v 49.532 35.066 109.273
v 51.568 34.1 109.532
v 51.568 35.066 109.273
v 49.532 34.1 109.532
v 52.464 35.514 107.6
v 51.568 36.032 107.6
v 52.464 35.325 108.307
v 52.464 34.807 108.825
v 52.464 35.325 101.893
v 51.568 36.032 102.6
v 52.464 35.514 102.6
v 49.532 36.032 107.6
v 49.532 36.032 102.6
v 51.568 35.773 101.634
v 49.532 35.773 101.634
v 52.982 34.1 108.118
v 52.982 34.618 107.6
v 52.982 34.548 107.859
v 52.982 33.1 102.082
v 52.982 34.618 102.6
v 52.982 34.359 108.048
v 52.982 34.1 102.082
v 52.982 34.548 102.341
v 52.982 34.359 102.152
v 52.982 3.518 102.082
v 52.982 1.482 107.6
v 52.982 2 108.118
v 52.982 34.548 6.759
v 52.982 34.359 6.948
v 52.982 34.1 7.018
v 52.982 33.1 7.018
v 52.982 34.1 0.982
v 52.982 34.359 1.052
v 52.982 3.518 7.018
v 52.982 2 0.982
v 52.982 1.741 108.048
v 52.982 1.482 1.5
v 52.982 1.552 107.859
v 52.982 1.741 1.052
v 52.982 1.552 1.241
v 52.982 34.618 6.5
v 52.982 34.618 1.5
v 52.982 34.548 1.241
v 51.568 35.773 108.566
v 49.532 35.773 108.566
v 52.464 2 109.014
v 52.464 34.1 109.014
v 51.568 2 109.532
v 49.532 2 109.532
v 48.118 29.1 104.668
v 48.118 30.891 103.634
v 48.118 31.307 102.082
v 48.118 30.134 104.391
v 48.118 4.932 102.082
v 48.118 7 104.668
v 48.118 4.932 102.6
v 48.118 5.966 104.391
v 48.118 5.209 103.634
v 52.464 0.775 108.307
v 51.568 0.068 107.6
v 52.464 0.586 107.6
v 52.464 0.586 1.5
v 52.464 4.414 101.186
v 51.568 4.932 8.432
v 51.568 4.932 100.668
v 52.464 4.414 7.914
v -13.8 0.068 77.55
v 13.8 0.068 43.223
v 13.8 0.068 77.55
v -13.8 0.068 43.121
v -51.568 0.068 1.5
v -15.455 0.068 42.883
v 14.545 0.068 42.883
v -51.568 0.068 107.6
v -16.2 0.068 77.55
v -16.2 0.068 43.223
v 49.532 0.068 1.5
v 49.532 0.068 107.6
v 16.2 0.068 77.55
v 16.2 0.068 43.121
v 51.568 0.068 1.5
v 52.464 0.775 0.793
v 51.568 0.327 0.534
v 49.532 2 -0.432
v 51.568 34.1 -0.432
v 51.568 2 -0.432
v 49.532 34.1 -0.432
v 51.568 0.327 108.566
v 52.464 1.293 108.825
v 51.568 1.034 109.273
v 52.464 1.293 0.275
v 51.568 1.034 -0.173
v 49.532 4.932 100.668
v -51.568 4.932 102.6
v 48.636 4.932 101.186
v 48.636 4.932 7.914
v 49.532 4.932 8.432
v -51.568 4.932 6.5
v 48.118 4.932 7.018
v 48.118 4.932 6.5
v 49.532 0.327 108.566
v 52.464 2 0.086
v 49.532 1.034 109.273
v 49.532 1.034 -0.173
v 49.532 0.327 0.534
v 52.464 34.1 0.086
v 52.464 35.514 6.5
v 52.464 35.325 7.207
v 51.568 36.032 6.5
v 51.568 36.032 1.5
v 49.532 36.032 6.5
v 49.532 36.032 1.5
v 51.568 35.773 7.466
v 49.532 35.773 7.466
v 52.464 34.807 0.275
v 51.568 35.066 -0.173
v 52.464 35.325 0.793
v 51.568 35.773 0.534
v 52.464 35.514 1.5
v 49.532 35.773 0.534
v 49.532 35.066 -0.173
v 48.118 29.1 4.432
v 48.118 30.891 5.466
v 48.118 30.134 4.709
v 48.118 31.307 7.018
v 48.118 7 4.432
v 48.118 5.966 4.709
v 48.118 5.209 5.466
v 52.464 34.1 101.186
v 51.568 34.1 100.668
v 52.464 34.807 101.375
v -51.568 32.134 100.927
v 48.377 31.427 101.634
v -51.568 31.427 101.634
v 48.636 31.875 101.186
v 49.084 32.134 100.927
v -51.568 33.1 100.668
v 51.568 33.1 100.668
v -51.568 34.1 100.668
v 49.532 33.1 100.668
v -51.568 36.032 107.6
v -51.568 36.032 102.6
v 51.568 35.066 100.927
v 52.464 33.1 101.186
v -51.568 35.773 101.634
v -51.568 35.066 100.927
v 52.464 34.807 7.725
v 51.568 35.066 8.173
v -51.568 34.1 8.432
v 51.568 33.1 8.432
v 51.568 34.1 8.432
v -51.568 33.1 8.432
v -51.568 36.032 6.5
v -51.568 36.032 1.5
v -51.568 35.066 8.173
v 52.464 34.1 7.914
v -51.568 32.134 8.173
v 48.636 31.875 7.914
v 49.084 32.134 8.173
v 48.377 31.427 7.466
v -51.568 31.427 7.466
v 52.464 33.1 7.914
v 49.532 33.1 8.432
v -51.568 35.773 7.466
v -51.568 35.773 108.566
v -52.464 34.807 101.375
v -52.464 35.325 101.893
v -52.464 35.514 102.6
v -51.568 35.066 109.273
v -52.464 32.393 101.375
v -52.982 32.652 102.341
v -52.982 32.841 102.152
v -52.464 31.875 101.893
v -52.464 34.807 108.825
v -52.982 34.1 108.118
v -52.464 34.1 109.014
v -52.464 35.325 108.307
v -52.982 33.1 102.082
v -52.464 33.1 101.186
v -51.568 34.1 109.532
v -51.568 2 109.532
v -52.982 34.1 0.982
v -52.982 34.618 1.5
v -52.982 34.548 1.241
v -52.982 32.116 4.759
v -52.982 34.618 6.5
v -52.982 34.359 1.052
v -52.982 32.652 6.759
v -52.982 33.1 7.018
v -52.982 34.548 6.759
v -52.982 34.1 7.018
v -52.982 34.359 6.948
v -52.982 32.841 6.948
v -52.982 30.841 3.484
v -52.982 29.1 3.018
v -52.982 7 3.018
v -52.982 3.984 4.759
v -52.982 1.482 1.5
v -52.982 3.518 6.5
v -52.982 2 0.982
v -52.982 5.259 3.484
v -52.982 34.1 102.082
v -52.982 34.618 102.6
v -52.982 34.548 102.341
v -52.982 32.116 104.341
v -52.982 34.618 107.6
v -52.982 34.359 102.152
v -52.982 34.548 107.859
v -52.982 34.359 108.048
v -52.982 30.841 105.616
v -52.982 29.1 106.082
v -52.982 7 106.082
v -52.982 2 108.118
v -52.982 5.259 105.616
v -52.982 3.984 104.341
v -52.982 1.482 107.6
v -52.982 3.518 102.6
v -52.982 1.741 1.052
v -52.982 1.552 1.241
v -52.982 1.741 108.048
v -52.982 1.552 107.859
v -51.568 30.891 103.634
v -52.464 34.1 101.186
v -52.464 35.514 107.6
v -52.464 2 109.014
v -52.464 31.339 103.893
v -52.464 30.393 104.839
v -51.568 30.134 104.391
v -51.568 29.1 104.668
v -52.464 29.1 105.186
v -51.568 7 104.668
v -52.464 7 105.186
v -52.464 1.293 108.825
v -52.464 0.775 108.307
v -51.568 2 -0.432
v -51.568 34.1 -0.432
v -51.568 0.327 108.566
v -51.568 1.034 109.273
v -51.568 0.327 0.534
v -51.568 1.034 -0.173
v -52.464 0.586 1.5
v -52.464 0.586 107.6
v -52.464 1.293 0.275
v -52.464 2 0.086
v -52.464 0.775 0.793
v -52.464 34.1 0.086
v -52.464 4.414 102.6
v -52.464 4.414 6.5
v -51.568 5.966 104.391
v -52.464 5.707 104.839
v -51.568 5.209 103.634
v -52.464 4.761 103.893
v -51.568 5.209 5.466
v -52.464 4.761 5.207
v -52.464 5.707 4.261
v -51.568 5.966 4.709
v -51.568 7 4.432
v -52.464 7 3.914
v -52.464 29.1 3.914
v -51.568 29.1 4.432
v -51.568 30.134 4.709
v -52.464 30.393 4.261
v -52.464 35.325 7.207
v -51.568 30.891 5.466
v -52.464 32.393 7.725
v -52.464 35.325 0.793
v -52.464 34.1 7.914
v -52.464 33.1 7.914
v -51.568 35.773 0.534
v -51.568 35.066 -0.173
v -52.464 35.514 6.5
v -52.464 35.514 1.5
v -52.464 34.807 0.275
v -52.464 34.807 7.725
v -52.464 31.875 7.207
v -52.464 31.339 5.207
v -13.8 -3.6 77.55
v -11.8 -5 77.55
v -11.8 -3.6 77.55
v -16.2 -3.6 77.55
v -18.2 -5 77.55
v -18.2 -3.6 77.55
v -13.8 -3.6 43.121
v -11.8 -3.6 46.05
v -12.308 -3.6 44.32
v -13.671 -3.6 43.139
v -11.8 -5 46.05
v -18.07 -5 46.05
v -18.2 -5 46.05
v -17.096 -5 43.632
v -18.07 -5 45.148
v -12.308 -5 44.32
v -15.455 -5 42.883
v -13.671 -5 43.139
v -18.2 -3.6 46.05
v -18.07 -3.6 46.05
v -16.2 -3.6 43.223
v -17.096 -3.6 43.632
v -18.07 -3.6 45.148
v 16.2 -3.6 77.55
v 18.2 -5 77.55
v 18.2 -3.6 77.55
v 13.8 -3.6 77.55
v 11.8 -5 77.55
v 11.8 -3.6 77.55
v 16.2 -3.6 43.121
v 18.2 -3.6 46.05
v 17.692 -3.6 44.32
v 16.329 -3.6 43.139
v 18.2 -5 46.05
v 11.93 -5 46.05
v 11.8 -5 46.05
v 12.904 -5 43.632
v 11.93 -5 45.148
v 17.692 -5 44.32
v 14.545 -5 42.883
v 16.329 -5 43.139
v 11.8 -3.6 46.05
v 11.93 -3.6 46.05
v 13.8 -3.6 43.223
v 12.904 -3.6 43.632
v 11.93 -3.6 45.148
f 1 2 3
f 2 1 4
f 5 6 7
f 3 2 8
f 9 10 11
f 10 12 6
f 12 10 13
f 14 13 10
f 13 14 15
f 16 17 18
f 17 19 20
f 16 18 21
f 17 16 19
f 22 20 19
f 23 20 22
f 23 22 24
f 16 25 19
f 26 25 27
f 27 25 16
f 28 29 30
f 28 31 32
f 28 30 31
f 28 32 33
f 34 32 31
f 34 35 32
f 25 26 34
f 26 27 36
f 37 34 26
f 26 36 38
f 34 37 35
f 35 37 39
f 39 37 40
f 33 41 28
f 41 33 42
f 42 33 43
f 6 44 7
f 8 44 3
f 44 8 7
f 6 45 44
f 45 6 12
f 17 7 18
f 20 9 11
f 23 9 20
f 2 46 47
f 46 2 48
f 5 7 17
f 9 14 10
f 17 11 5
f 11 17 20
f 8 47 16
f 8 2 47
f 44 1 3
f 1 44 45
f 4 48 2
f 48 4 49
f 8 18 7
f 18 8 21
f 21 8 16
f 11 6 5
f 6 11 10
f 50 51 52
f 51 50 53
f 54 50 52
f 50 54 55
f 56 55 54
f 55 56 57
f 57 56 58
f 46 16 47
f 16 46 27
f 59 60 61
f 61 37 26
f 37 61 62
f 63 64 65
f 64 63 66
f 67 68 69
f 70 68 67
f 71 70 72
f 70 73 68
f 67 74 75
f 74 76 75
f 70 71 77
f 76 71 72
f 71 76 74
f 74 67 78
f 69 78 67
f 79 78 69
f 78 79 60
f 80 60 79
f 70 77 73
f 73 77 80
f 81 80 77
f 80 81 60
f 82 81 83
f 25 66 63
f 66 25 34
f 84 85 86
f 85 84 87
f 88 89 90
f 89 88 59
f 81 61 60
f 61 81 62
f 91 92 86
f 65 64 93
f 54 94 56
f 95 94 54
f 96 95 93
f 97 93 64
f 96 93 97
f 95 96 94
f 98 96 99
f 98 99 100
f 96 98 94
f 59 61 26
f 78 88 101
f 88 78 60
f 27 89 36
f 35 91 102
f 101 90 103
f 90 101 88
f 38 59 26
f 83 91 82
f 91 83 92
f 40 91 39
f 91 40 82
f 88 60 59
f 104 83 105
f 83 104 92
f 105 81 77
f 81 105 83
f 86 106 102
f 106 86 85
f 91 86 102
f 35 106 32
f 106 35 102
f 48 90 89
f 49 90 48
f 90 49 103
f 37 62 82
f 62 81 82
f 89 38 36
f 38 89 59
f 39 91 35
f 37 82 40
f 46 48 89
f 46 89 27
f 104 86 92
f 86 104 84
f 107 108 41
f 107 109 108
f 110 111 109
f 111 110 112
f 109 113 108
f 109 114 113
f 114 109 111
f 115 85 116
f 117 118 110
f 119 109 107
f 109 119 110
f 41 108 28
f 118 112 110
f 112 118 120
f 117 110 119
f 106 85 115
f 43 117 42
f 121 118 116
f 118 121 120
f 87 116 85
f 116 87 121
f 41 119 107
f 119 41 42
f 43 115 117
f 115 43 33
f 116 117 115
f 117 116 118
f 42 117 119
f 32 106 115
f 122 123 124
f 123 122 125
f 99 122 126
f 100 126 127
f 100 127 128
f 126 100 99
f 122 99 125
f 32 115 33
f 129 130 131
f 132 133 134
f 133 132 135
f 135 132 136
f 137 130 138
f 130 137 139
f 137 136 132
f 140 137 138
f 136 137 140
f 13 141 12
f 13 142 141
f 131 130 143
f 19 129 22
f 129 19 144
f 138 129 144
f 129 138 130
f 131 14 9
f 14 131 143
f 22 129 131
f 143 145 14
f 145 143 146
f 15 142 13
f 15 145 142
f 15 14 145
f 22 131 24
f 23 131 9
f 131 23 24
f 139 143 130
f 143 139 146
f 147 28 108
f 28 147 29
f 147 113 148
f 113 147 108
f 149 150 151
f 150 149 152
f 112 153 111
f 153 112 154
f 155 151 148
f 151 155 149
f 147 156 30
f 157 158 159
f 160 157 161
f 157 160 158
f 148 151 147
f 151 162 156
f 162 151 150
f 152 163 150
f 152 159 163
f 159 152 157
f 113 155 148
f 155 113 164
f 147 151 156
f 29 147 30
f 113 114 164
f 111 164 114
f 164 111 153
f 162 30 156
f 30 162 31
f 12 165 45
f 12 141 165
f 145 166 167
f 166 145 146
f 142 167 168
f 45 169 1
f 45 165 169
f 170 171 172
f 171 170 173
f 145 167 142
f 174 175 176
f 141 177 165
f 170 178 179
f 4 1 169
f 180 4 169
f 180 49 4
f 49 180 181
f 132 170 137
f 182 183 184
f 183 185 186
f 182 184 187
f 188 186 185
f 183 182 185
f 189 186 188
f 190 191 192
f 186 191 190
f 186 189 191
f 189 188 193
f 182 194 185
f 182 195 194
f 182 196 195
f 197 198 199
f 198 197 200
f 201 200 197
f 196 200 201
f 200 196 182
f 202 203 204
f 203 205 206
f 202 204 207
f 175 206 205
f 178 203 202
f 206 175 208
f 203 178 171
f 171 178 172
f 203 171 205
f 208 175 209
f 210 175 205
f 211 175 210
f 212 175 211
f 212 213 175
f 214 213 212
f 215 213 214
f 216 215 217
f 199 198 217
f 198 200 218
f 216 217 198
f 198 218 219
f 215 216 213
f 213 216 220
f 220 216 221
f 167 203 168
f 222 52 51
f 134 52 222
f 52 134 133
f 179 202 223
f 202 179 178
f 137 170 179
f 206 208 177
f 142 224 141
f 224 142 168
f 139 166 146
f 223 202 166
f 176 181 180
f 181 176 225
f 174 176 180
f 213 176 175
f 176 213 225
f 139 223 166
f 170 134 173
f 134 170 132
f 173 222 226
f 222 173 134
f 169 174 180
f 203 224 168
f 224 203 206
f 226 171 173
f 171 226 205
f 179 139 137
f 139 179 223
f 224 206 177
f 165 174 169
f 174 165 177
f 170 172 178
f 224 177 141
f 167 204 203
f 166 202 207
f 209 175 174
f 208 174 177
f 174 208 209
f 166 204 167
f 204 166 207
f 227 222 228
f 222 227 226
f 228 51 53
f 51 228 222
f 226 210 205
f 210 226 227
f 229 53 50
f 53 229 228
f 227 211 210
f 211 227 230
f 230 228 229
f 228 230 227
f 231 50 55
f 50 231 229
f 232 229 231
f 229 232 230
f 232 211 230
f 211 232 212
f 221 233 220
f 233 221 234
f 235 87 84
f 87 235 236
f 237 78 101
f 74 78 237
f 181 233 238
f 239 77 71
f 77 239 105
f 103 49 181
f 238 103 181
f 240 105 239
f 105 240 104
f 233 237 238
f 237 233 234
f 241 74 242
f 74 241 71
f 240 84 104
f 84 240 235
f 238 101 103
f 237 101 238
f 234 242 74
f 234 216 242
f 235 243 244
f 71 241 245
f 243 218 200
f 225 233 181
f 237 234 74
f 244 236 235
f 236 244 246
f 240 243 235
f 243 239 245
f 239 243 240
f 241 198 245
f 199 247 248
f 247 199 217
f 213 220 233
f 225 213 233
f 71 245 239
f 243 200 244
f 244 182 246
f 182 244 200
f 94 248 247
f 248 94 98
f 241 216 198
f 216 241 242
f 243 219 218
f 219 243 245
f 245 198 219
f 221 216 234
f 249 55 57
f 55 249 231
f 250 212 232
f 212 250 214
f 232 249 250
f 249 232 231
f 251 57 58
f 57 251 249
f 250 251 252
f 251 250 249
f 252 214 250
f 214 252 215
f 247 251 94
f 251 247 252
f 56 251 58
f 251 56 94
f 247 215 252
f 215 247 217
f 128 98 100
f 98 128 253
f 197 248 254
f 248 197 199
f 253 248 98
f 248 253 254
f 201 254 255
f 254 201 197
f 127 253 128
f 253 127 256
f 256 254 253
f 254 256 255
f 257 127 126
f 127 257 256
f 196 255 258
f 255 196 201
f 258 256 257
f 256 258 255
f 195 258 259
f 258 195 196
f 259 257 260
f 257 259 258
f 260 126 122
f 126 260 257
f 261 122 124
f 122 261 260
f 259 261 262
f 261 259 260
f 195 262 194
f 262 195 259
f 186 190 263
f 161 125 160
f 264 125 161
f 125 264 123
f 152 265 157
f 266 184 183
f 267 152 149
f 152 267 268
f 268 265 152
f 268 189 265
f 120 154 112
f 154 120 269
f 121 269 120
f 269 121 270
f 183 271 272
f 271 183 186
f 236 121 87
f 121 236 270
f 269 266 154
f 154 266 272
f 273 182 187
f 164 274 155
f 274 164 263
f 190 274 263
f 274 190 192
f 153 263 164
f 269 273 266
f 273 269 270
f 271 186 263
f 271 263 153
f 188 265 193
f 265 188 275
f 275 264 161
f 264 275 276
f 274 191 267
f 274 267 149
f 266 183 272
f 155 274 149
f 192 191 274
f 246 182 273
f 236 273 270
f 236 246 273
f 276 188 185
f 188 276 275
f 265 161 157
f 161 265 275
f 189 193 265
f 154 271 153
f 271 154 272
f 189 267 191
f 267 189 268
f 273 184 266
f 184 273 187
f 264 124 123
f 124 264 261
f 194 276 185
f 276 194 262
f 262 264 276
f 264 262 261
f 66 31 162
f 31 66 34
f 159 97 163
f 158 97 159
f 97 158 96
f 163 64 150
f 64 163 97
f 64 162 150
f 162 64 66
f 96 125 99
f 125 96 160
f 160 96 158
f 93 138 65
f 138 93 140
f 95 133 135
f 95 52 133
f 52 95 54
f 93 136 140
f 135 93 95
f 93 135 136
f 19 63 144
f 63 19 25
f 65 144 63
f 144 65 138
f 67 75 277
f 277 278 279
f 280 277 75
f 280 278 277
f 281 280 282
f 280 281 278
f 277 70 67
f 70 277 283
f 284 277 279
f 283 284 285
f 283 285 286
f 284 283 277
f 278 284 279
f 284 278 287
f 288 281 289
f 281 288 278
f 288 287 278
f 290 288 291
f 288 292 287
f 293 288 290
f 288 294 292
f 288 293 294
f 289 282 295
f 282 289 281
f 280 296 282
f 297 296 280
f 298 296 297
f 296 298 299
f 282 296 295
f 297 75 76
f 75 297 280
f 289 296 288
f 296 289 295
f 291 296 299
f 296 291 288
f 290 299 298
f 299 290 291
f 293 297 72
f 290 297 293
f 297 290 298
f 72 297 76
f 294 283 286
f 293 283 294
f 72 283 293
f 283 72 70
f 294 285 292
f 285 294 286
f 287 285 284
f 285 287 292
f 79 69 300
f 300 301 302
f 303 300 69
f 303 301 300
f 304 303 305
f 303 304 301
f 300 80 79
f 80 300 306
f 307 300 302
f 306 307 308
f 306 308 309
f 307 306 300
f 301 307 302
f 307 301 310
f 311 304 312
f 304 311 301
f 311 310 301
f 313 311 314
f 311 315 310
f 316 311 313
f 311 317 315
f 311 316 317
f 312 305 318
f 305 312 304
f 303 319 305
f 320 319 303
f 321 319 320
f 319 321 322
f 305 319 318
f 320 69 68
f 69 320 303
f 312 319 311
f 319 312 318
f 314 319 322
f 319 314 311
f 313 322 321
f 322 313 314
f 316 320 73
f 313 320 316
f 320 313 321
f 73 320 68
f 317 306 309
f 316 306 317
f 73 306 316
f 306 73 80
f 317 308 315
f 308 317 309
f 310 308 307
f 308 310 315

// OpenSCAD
// file: modules/fixing.scad
// See fixing.png for guidance

rounding_mm = 2; // r
height_mm = 45;
beam_width_mm = 40; // BW
beam_rounding_mm = 3; // Br
outer_beam_rounding_mm = 8; // OBr
thickness_mm = 10; // T
assert(thickness_mm>2*rounding_mm, "thickness_mm is too small");
overlap_width_mm = 4.1; // OW; 3 was too small for minkowski, 4 was too small too
assert(overlap_width_mm>2*rounding_mm, "overlap_width_mm is too small");
overlap_length_mm = 4; // OL
assert(overlap_length_mm>rounding_mm, "overlap_length_mm is too small");
hole_diam_mm = 6; // HD
hole_pos_mm = 24; // HP
countersink_diam_mm = 14; // CsW
countersink_depth_mm = 4; // CsS
notch_pos_mm = 5;
notch_height_mm = height_mm-10;
notch_entry_width_mm = 3; // EW
notch_entry_depth_mm = 3; // ED
notch_corner_width_mm = 2; // EW'
notch_corner_depth_mm = 2; // ED'

rail_play_mm = 0.3;

module rail(play_mm=rail_play_mm, height_offset_mm=0) {
    actual_height_mm = notch_height_mm + height_offset_mm - play_mm;
    actual_entry_width_mm = notch_entry_width_mm - 2*play_mm;
    actual_entry_depth_mm = notch_entry_depth_mm + 2*play_mm;
    actual_corner_width_mm = notch_corner_width_mm;
    actual_corner_depth_mm = notch_corner_depth_mm - 2*play_mm;
    entry_overflow_mm = 1;

    translate([0,0,height_mm-actual_height_mm])
    difference() {
        linear_extrude(actual_height_mm)
        union() {
            translate([-actual_entry_width_mm/2, -entry_overflow_mm])
                square([actual_entry_width_mm, actual_entry_depth_mm+entry_overflow_mm]);
            translate([-actual_entry_width_mm/2-actual_corner_width_mm, actual_entry_depth_mm])
                square([actual_entry_width_mm+2*actual_corner_width_mm, actual_corner_depth_mm]);
        }

        // bottom rounding
        d = actual_entry_width_mm+2*actual_corner_width_mm;
        translate([0, -1, d/2])
        rotate([-90,0,0])
        linear_extrude(actual_entry_depth_mm+actual_corner_depth_mm+2)
        difference() {
            translate([-d/2-1,0]) square([d+2, d/2+1]);
            circle(d=d);
        }
    }
}

module rails_x2(along="x", play_mm=rail_play_mm, height_offset_mm=0, center=true) {
    rotation = along=="x"?0:along=="y"?90:undef;
    rotate([0,0,rotation]) translate([center?-thickness_mm-beam_width_mm/2:0,0,center?-height_mm/2:0]) {
        translate([thickness_mm+notch_pos_mm, 0, 0]) rotate([0,0,-2*rotation]) rail(play_mm, height_offset_mm);
        translate([thickness_mm+beam_width_mm-notch_pos_mm, 0, 0]) rotate([0,0,-2*rotation]) rail(play_mm, height_offset_mm);
    }
}

module notch() {
    rail(play_mm=0, height_offset_mm=1);
}

module notches_x2(along="x", center=false) {
    rails_x2(along=along, play_mm=0, height_offset_mm=1, center=center);
}

module fixing(with_notches=true) {
    // "kernel" measures = measures before rounding (minkowski)
    kernel_height_mm = height_mm-2*rounding_mm;
    kernel_thickness_mm = thickness_mm-2*rounding_mm; // kT
    kernel_beam_rounding_mm = beam_rounding_mm+rounding_mm; // kBr
    kernel_outer_beam_rounding_mm = outer_beam_rounding_mm-rounding_mm; // kOBr

    difference() {
        translate([rounding_mm, rounding_mm, rounding_mm])
        minkowski() {
            $fn = 20; // no need for many facets here
            linear_extrude(kernel_height_mm)
            union() {
                difference() {
                    square(beam_width_mm+kernel_thickness_mm+overlap_width_mm);
                    translate([kernel_thickness_mm, kernel_thickness_mm])
                        square(beam_width_mm+2*rounding_mm);
                    translate([kernel_thickness_mm+overlap_length_mm, kernel_thickness_mm+overlap_length_mm])
                        square(beam_width_mm+1);
                    difference() {
                        square(kernel_outer_beam_rounding_mm);
                        translate([kernel_outer_beam_rounding_mm, kernel_outer_beam_rounding_mm])
                            circle($fn=20, r=kernel_outer_beam_rounding_mm);
                    }
                }
                translate([kernel_thickness_mm, kernel_thickness_mm]) difference() {
                    square(kernel_beam_rounding_mm);
                    translate([kernel_beam_rounding_mm, kernel_beam_rounding_mm])
                        circle($fn=20, r=kernel_beam_rounding_mm);
                }
            }
            sphere(r=rounding_mm);
        }
        translate([thickness_mm+hole_pos_mm, -1, height_mm/2]) rotate([-90,0,0]) {
            cylinder($fn=60, h=thickness_mm+2, d=hole_diam_mm);
            cylinder($fn=60, h=countersink_depth_mm+1, d=countersink_diam_mm);
        }
        translate([-1, thickness_mm+hole_pos_mm, height_mm/2]) rotate([0,90,0]) {
            cylinder($fn=60, h=thickness_mm+2, d=hole_diam_mm);
            cylinder($fn=60, h=countersink_depth_mm+1, d=countersink_diam_mm);
        }
        if (with_notches) {
            notches_x2("x");
            notches_x2("y");
        }
    }
}

fixing(true);

// Tests

module rails_test() {
    test_width_mm = beam_width_mm+overlap_width_mm+thickness_mm;
    union() {
        $fn = 20;
        translate([-beam_width_mm/2-thickness_mm, -thickness_mm/2, -height_mm/2]) cube([test_width_mm, thickness_mm/2, height_mm]);
        rails_x2("x", center=true);
    }
}

module notches_test() {
    test_width_mm = beam_width_mm+overlap_width_mm+thickness_mm;
    difference() {
        $fn = 20;
        translate([-beam_width_mm/2-thickness_mm, 0, -height_mm/2]) cube([test_width_mm, thickness_mm, height_mm]);
        translate([0, 0, 1]) notches_x2("x", center=true);
    }
}

module all_tests() {
    translate([0, thickness_mm]) notches_test();
    translate([0, -thickness_mm]) rails_test();
}

module visual_test() {
    color("green") notches_test();
    color("red") translate([0,-rail_play_mm,0]) rails_test();
}
// main file
use <modules/fixing.scad>

rounding_mm = 2;
thickness_mm = 5;
overlap_length_mm = 4;

switch_width_mm = 100;
switch_depth_mm = 99;
switch_height_mm = 26;
play_mm = 0.1;

actual_width_mm = switch_width_mm + play_mm;
actual_depth_mm = switch_depth_mm + play_mm;
actual_height_mm = switch_height_mm + play_mm;

outer_width_mm = actual_width_mm + 2*thickness_mm;
outer_depth_mm = actual_height_mm + 2*thickness_mm;
outer_height_mm = actual_depth_mm + thickness_mm;

module hanger() {
    inner_kernel_width_mm = actual_width_mm - 2*rounding_mm;
    outer_kernel_width_mm = outer_width_mm - 2*rounding_mm;
    inner_kernel_depth_mm = actual_height_mm - 2*rounding_mm;
    outer_kernel_depth_mm = outer_depth_mm - 2*rounding_mm;
    //inner_kernel_height_mm = actual_depth_mm - rounding_mm;
    outer_kernel_height_mm = outer_height_mm - rounding_mm;
    overlap_kernel_length_mm = overlap_length_mm - rounding_mm;

    translate([0,0,actual_depth_mm/2 + thickness_mm])
    rotate([0,-90,0])
    translate([0, 0, -actual_width_mm/2 - thickness_mm + rounding_mm])
    translate([0, 0, rounding_mm])
    minkowski() {
        $fn = 12; // no need for many facets here
        union() {
            linear_extrude(outer_kernel_height_mm)
            // extrusion base
            difference() {
                translate([-outer_kernel_width_mm/2,rounding_mm])
                    square([outer_kernel_width_mm, outer_kernel_depth_mm]);
                translate([-inner_kernel_width_mm/2,thickness_mm+rounding_mm])
                    offset(r=2*rounding_mm) square([inner_kernel_width_mm, inner_kernel_depth_mm]);
                translate([-actual_width_mm/2 + overlap_kernel_length_mm, thickness_mm+rounding_mm, 0])
                    square([actual_width_mm - 2*overlap_kernel_length_mm, outer_kernel_depth_mm]);
            }

            // lower overlap
            lower_overlap_width_mm = thickness_mm + overlap_length_mm - 2*rounding_mm;
            translate([outer_kernel_width_mm/2-lower_overlap_width_mm,rounding_mm,0])
                cube([lower_overlap_width_mm, outer_kernel_depth_mm, thickness_mm-2*rounding_mm]);
            translate([-outer_kernel_width_mm/2,rounding_mm,0])
                cube([lower_overlap_width_mm, outer_kernel_depth_mm, thickness_mm-2*rounding_mm]);

        }
        sphere(r=rounding_mm);
    }
}

hanger();
translate([0,0,outer_width_mm/2])
    mirror([0,1,0]) rails_x2("x");
